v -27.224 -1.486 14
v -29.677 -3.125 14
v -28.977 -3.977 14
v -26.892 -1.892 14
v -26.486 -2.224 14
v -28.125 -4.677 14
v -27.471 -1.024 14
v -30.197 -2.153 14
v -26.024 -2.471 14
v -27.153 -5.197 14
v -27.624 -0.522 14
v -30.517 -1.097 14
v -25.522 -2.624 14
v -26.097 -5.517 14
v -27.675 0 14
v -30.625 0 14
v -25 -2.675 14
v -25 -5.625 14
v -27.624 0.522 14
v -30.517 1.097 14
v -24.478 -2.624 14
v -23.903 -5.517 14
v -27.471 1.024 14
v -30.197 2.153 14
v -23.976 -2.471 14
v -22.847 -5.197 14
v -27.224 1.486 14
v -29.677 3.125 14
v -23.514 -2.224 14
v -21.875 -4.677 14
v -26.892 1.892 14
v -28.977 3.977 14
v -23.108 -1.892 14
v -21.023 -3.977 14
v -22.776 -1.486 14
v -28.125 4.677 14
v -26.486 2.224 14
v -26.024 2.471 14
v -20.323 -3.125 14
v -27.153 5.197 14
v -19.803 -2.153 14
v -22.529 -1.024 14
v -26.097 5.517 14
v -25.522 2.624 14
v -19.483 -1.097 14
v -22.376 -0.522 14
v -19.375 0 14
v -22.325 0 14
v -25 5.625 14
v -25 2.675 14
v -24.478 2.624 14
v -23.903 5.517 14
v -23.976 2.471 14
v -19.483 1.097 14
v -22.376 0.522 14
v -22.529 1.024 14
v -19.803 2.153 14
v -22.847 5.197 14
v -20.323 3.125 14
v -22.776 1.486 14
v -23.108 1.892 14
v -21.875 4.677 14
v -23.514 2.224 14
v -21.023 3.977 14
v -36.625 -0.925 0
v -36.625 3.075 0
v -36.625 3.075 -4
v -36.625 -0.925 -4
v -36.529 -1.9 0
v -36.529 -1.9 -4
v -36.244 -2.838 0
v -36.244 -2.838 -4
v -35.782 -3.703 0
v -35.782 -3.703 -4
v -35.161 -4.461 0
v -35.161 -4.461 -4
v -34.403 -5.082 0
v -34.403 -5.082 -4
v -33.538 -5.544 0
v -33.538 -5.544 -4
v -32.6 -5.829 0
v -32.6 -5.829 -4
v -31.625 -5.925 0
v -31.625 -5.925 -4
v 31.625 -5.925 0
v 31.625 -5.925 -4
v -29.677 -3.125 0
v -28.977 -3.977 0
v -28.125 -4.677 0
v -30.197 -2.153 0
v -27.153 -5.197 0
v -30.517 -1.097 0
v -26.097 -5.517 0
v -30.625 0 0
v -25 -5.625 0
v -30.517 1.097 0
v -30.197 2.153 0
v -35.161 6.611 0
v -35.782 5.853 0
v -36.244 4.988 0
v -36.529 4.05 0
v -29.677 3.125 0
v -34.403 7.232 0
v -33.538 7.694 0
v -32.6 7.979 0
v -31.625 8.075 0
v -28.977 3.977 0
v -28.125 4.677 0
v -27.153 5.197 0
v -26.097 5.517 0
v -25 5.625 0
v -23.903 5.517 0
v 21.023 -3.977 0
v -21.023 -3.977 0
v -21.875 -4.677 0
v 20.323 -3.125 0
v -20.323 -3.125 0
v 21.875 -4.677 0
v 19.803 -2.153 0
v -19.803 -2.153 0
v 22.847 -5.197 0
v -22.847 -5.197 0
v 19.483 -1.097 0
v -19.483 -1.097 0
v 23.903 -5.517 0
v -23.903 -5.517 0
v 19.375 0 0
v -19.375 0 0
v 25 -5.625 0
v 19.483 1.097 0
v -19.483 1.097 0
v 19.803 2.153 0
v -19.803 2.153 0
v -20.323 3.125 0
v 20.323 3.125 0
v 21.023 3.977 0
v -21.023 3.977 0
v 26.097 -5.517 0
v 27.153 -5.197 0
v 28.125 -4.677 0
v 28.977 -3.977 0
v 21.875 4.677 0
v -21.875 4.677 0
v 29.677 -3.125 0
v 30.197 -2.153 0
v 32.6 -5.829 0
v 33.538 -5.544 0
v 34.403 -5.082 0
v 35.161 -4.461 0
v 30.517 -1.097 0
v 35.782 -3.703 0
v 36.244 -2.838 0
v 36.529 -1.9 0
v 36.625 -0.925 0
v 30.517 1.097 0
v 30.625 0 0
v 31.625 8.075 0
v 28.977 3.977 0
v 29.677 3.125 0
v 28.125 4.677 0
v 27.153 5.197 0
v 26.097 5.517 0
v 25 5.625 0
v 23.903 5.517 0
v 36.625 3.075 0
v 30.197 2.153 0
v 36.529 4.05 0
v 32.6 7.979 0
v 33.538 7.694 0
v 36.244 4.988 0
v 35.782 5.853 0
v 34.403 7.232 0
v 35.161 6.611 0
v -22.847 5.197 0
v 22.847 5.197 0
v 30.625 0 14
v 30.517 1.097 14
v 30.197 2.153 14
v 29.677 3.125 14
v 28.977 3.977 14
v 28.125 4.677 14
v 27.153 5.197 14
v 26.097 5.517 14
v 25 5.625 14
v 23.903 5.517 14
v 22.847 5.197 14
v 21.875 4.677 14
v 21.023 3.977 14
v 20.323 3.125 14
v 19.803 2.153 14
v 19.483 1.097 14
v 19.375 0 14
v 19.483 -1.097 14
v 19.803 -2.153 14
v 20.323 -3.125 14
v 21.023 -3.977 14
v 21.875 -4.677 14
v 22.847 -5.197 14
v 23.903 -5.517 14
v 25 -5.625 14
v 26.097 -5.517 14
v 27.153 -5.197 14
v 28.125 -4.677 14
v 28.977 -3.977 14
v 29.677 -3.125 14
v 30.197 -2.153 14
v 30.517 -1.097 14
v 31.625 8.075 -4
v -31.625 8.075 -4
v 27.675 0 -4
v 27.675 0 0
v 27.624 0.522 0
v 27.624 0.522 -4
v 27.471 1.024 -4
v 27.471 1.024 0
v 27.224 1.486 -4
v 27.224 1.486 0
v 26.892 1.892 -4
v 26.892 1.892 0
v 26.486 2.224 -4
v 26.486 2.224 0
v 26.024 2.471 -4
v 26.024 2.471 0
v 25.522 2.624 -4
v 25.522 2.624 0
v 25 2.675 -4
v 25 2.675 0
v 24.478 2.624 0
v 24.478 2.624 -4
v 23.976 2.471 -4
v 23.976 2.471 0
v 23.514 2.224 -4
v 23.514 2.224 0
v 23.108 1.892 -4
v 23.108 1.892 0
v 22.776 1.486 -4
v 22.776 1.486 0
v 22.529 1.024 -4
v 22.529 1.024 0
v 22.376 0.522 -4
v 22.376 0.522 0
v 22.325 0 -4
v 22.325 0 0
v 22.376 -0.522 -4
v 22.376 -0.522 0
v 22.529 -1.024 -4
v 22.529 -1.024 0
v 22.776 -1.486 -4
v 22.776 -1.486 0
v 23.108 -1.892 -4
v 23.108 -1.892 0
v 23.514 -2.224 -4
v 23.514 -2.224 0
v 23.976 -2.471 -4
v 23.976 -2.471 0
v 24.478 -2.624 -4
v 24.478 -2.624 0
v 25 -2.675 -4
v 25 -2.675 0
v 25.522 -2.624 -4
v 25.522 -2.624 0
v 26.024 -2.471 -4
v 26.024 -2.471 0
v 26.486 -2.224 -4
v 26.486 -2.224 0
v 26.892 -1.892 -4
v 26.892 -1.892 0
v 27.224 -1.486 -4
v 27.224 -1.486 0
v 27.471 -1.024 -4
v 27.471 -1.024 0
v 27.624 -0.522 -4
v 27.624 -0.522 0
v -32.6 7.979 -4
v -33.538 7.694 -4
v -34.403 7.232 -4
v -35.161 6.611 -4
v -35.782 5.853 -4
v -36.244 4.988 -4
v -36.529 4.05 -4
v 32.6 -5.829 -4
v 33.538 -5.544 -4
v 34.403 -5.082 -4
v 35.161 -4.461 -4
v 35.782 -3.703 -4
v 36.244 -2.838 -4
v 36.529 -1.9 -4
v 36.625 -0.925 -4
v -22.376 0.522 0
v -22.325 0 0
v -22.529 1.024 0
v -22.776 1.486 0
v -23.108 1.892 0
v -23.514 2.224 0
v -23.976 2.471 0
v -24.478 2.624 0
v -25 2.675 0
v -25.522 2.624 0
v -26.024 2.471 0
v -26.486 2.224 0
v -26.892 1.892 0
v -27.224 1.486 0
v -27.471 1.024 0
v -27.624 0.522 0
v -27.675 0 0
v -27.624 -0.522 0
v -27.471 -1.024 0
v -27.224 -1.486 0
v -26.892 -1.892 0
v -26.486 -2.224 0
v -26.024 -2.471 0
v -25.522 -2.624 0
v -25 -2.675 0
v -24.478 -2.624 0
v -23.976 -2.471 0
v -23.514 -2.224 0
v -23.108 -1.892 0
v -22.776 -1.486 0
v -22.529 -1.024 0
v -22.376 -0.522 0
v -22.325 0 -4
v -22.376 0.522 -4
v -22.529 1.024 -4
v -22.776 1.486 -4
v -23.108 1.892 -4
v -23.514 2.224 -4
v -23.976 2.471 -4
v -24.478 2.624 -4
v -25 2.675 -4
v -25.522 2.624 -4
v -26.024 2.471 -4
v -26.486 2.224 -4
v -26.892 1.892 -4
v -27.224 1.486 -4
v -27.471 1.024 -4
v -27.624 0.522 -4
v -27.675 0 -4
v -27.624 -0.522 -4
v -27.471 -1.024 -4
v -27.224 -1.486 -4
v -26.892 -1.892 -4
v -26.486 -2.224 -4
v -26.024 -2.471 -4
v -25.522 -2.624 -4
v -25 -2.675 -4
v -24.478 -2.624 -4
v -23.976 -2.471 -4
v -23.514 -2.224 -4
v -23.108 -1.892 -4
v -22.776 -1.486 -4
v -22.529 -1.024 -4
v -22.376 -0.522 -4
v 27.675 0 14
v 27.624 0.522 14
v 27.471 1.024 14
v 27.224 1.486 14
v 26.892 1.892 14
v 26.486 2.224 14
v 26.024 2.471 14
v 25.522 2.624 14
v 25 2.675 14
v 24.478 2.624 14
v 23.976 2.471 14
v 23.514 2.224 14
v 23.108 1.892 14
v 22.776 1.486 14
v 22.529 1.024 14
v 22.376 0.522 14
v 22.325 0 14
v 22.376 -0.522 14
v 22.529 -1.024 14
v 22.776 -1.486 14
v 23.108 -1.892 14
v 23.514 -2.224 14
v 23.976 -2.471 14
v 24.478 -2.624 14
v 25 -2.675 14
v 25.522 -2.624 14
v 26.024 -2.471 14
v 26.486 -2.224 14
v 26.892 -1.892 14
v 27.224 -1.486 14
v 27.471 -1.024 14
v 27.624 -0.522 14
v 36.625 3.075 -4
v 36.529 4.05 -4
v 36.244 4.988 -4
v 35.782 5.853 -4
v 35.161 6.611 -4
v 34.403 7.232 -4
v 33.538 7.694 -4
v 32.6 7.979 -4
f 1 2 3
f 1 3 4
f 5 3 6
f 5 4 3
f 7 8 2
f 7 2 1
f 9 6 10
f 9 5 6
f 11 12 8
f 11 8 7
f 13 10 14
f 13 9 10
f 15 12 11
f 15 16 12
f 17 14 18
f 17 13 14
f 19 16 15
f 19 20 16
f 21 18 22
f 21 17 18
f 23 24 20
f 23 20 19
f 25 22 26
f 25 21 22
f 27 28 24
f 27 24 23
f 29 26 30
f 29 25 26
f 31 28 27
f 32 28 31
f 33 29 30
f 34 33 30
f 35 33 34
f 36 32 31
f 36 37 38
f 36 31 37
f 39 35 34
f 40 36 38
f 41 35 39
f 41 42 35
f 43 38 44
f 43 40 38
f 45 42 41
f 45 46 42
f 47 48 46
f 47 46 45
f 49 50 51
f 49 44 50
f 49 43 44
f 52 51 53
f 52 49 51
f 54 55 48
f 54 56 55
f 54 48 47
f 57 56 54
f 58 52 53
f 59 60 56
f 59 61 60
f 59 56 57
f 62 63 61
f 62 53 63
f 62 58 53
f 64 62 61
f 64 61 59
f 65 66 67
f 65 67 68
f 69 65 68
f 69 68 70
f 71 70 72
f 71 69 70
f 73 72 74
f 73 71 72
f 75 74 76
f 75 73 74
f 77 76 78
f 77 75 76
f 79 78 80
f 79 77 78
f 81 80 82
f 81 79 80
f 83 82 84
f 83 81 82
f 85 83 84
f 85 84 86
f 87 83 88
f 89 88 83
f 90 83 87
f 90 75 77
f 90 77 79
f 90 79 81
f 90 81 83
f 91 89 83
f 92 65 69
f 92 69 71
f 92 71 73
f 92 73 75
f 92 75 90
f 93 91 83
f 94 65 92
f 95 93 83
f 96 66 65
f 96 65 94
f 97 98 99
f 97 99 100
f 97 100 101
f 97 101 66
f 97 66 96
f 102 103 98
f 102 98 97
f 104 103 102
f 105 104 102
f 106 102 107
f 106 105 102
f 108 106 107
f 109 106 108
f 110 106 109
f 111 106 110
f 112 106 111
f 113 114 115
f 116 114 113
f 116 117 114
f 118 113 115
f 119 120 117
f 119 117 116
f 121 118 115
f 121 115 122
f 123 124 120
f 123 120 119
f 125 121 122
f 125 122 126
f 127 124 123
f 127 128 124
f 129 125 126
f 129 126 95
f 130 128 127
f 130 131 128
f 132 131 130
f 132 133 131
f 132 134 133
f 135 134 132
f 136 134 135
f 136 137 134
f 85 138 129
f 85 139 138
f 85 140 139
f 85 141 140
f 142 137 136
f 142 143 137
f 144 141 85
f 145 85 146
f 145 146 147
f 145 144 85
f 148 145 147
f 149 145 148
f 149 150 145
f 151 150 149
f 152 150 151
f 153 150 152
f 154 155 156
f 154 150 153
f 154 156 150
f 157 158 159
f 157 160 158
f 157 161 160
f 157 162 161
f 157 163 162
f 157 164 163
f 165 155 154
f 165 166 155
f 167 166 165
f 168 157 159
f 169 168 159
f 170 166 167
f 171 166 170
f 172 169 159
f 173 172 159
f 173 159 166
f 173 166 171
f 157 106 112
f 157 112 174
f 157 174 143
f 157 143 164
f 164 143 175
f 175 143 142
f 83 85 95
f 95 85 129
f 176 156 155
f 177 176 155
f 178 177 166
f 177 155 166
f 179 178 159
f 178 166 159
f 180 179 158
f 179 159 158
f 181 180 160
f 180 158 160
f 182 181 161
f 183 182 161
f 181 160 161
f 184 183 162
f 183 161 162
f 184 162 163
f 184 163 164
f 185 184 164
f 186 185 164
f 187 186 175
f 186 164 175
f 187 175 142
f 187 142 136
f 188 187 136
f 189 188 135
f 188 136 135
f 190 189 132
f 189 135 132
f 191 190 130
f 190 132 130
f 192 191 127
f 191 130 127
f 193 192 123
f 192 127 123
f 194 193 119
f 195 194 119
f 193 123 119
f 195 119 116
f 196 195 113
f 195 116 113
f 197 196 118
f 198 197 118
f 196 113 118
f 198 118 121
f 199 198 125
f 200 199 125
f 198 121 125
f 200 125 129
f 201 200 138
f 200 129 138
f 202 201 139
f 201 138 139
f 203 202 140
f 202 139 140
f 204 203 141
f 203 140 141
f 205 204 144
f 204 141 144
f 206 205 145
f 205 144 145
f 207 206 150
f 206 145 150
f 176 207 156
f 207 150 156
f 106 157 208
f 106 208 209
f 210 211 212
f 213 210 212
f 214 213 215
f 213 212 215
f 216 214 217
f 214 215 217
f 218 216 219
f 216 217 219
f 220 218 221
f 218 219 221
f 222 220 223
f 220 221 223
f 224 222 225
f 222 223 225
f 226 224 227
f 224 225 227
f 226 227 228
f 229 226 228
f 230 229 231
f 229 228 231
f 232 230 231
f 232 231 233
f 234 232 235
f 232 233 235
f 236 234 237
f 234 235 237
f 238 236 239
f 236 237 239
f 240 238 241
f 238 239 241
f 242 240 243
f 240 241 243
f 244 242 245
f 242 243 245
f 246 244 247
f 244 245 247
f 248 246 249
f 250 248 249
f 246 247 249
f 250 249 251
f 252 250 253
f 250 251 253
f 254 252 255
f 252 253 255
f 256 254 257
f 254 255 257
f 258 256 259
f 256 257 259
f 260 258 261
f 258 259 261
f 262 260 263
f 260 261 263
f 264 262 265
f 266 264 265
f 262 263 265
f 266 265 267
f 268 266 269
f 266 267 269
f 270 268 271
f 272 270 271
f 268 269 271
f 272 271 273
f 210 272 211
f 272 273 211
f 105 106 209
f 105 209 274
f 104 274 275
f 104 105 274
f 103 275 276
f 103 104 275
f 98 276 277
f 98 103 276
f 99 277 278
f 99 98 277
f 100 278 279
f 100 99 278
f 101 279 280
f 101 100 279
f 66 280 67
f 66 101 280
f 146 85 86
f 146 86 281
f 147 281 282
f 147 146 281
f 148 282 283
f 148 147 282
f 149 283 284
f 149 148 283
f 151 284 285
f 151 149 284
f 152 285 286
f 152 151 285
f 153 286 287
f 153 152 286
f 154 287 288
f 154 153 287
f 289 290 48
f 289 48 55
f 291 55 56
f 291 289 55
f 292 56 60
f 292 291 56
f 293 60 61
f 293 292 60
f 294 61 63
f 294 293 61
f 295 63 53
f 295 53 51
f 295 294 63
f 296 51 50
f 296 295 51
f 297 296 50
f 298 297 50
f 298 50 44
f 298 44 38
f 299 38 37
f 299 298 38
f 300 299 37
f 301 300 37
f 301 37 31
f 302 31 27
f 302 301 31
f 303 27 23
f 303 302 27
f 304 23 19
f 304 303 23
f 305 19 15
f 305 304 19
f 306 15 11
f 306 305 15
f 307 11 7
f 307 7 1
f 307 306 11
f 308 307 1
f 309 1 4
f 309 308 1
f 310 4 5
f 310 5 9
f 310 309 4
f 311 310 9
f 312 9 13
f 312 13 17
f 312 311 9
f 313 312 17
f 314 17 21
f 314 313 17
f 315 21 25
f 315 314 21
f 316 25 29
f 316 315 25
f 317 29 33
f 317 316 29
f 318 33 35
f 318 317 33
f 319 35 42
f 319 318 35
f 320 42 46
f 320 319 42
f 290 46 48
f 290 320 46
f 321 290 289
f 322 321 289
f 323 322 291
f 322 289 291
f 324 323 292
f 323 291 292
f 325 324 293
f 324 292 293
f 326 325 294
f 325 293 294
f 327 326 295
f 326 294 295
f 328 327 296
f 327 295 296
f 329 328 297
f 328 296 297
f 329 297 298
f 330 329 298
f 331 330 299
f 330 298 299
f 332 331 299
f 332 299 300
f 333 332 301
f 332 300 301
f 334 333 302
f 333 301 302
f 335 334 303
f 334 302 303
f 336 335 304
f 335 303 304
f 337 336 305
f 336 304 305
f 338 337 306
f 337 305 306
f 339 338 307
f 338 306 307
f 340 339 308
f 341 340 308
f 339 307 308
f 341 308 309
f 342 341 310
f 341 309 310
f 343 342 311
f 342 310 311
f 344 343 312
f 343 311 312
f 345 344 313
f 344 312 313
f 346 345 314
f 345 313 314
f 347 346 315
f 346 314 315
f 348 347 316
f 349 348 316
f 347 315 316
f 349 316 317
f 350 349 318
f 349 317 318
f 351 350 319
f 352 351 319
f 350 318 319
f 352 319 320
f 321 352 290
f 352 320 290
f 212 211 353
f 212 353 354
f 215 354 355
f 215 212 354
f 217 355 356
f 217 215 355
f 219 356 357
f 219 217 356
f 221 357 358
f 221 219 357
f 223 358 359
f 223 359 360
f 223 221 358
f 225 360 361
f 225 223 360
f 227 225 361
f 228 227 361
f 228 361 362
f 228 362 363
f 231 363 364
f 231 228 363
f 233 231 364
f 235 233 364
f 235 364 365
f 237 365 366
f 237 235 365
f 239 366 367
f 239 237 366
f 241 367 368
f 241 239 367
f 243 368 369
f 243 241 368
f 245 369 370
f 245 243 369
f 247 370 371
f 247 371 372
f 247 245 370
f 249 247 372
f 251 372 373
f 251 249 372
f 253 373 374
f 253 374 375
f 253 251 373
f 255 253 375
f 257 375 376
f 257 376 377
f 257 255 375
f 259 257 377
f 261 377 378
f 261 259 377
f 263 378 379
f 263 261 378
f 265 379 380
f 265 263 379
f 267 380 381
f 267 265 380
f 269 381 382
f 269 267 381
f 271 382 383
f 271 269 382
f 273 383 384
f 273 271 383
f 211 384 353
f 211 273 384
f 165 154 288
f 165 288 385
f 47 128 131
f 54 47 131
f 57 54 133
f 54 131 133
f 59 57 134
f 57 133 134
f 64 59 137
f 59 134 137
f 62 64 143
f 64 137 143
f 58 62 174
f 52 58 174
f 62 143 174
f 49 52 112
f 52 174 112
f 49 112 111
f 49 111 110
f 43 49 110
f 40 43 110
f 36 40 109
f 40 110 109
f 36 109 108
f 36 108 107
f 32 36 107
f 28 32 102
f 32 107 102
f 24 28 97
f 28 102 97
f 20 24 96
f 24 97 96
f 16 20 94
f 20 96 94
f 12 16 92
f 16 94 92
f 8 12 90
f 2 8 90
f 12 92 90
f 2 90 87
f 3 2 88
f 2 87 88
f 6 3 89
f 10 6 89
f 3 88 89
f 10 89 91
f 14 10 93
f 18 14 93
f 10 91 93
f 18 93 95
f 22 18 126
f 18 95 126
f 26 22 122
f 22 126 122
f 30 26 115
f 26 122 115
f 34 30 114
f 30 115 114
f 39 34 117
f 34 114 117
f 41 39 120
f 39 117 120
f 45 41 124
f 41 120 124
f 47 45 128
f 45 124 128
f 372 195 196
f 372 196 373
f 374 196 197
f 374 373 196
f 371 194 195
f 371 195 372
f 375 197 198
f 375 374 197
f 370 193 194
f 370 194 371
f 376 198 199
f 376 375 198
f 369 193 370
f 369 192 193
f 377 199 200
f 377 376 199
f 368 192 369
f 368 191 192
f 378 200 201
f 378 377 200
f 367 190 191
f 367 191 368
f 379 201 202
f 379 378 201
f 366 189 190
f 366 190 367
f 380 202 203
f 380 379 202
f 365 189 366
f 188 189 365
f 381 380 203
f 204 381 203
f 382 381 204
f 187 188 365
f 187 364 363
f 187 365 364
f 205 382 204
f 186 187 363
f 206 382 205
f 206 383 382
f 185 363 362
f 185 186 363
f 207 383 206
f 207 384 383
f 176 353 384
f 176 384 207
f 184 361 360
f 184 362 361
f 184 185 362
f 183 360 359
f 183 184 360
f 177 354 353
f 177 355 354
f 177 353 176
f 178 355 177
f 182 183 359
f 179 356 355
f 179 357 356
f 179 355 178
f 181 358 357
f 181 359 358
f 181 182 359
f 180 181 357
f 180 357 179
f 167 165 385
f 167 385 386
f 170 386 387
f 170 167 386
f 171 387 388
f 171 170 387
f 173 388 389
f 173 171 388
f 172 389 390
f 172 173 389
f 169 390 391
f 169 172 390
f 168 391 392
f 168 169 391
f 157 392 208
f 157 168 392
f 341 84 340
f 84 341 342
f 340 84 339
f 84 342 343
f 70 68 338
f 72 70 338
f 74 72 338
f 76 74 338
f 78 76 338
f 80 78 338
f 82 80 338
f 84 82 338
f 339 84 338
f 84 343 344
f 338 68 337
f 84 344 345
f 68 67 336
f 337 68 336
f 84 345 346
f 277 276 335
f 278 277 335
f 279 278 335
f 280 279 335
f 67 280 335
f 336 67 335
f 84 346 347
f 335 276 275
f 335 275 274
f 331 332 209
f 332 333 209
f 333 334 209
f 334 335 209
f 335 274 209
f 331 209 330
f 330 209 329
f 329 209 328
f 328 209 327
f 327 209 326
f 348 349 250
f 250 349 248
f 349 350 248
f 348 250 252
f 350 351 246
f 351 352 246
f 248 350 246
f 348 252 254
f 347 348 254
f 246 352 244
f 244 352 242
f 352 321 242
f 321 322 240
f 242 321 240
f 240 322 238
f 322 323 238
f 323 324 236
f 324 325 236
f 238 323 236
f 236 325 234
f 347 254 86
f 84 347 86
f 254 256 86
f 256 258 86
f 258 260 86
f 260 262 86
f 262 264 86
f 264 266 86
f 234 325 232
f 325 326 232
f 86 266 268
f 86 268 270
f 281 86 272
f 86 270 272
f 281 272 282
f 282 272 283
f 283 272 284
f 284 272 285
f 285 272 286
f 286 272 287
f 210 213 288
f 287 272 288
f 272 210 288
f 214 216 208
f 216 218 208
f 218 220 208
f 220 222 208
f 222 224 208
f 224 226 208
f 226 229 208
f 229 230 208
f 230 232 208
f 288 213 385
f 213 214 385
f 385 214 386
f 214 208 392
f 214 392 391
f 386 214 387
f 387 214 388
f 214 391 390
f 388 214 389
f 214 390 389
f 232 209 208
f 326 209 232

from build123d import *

# Parameters (mm, degrees)
F0_R     = 5.625
F0_R_2   = 2.675
F1_DEPTH = 14
F2_DEPTH = 4


with BuildPart() as f1:
    # F0 (on Top) → F1 (new body)
    with BuildSketch(Plane.XY):
        with Locations((-25, 0)):
            Circle(F0_R)
        with Locations((-25, 0)):
            Circle(F0_R_2, mode=Mode.SUBTRACT)
        with Locations((25, 0)):
            Circle(F0_R)
        with Locations((25, 0)):
            Circle(F0_R_2, mode=Mode.SUBTRACT)
    extrude(amount=F1_DEPTH)

    # F0 (on Top) → F2 (join)
    with BuildSketch(Plane.XY):
        with BuildLine():
            Line((31.625, 8.075), (-31.625, 8.075))
            ThreePointArc((-31.625, 8.075), (-35.160534, 6.610534), (-36.625, 3.075))
            Line((-36.625, 3.075), (-36.625, -0.925))
            ThreePointArc((-36.625, -0.925), (-35.160534, -4.460534), (-31.625, -5.925))
            Line((-31.625, -5.925), (31.625, -5.925))
            ThreePointArc((31.625, -5.925), (35.160534, -4.460534), (36.625, -0.925))
            Line((36.625, -0.925), (36.625, 3.075))
            ThreePointArc((36.625, 3.075), (35.160534, 6.610534), (31.625, 8.075))
        make_face()
        with Locations((-25, 0)):
            Circle(F0_R, mode=Mode.SUBTRACT)
        with Locations((25, 0)):
            Circle(F0_R, mode=Mode.SUBTRACT)
        with Locations((-25, 0)):
            Circle(F0_R)
        with Locations((-25, 0)):
            Circle(F0_R_2, mode=Mode.SUBTRACT)
        with Locations((25, 0)):
            Circle(F0_R)
        with Locations((25, 0)):
            Circle(F0_R_2, mode=Mode.SUBTRACT)
    extrude(amount=-F2_DEPTH)


solid = f1.part
